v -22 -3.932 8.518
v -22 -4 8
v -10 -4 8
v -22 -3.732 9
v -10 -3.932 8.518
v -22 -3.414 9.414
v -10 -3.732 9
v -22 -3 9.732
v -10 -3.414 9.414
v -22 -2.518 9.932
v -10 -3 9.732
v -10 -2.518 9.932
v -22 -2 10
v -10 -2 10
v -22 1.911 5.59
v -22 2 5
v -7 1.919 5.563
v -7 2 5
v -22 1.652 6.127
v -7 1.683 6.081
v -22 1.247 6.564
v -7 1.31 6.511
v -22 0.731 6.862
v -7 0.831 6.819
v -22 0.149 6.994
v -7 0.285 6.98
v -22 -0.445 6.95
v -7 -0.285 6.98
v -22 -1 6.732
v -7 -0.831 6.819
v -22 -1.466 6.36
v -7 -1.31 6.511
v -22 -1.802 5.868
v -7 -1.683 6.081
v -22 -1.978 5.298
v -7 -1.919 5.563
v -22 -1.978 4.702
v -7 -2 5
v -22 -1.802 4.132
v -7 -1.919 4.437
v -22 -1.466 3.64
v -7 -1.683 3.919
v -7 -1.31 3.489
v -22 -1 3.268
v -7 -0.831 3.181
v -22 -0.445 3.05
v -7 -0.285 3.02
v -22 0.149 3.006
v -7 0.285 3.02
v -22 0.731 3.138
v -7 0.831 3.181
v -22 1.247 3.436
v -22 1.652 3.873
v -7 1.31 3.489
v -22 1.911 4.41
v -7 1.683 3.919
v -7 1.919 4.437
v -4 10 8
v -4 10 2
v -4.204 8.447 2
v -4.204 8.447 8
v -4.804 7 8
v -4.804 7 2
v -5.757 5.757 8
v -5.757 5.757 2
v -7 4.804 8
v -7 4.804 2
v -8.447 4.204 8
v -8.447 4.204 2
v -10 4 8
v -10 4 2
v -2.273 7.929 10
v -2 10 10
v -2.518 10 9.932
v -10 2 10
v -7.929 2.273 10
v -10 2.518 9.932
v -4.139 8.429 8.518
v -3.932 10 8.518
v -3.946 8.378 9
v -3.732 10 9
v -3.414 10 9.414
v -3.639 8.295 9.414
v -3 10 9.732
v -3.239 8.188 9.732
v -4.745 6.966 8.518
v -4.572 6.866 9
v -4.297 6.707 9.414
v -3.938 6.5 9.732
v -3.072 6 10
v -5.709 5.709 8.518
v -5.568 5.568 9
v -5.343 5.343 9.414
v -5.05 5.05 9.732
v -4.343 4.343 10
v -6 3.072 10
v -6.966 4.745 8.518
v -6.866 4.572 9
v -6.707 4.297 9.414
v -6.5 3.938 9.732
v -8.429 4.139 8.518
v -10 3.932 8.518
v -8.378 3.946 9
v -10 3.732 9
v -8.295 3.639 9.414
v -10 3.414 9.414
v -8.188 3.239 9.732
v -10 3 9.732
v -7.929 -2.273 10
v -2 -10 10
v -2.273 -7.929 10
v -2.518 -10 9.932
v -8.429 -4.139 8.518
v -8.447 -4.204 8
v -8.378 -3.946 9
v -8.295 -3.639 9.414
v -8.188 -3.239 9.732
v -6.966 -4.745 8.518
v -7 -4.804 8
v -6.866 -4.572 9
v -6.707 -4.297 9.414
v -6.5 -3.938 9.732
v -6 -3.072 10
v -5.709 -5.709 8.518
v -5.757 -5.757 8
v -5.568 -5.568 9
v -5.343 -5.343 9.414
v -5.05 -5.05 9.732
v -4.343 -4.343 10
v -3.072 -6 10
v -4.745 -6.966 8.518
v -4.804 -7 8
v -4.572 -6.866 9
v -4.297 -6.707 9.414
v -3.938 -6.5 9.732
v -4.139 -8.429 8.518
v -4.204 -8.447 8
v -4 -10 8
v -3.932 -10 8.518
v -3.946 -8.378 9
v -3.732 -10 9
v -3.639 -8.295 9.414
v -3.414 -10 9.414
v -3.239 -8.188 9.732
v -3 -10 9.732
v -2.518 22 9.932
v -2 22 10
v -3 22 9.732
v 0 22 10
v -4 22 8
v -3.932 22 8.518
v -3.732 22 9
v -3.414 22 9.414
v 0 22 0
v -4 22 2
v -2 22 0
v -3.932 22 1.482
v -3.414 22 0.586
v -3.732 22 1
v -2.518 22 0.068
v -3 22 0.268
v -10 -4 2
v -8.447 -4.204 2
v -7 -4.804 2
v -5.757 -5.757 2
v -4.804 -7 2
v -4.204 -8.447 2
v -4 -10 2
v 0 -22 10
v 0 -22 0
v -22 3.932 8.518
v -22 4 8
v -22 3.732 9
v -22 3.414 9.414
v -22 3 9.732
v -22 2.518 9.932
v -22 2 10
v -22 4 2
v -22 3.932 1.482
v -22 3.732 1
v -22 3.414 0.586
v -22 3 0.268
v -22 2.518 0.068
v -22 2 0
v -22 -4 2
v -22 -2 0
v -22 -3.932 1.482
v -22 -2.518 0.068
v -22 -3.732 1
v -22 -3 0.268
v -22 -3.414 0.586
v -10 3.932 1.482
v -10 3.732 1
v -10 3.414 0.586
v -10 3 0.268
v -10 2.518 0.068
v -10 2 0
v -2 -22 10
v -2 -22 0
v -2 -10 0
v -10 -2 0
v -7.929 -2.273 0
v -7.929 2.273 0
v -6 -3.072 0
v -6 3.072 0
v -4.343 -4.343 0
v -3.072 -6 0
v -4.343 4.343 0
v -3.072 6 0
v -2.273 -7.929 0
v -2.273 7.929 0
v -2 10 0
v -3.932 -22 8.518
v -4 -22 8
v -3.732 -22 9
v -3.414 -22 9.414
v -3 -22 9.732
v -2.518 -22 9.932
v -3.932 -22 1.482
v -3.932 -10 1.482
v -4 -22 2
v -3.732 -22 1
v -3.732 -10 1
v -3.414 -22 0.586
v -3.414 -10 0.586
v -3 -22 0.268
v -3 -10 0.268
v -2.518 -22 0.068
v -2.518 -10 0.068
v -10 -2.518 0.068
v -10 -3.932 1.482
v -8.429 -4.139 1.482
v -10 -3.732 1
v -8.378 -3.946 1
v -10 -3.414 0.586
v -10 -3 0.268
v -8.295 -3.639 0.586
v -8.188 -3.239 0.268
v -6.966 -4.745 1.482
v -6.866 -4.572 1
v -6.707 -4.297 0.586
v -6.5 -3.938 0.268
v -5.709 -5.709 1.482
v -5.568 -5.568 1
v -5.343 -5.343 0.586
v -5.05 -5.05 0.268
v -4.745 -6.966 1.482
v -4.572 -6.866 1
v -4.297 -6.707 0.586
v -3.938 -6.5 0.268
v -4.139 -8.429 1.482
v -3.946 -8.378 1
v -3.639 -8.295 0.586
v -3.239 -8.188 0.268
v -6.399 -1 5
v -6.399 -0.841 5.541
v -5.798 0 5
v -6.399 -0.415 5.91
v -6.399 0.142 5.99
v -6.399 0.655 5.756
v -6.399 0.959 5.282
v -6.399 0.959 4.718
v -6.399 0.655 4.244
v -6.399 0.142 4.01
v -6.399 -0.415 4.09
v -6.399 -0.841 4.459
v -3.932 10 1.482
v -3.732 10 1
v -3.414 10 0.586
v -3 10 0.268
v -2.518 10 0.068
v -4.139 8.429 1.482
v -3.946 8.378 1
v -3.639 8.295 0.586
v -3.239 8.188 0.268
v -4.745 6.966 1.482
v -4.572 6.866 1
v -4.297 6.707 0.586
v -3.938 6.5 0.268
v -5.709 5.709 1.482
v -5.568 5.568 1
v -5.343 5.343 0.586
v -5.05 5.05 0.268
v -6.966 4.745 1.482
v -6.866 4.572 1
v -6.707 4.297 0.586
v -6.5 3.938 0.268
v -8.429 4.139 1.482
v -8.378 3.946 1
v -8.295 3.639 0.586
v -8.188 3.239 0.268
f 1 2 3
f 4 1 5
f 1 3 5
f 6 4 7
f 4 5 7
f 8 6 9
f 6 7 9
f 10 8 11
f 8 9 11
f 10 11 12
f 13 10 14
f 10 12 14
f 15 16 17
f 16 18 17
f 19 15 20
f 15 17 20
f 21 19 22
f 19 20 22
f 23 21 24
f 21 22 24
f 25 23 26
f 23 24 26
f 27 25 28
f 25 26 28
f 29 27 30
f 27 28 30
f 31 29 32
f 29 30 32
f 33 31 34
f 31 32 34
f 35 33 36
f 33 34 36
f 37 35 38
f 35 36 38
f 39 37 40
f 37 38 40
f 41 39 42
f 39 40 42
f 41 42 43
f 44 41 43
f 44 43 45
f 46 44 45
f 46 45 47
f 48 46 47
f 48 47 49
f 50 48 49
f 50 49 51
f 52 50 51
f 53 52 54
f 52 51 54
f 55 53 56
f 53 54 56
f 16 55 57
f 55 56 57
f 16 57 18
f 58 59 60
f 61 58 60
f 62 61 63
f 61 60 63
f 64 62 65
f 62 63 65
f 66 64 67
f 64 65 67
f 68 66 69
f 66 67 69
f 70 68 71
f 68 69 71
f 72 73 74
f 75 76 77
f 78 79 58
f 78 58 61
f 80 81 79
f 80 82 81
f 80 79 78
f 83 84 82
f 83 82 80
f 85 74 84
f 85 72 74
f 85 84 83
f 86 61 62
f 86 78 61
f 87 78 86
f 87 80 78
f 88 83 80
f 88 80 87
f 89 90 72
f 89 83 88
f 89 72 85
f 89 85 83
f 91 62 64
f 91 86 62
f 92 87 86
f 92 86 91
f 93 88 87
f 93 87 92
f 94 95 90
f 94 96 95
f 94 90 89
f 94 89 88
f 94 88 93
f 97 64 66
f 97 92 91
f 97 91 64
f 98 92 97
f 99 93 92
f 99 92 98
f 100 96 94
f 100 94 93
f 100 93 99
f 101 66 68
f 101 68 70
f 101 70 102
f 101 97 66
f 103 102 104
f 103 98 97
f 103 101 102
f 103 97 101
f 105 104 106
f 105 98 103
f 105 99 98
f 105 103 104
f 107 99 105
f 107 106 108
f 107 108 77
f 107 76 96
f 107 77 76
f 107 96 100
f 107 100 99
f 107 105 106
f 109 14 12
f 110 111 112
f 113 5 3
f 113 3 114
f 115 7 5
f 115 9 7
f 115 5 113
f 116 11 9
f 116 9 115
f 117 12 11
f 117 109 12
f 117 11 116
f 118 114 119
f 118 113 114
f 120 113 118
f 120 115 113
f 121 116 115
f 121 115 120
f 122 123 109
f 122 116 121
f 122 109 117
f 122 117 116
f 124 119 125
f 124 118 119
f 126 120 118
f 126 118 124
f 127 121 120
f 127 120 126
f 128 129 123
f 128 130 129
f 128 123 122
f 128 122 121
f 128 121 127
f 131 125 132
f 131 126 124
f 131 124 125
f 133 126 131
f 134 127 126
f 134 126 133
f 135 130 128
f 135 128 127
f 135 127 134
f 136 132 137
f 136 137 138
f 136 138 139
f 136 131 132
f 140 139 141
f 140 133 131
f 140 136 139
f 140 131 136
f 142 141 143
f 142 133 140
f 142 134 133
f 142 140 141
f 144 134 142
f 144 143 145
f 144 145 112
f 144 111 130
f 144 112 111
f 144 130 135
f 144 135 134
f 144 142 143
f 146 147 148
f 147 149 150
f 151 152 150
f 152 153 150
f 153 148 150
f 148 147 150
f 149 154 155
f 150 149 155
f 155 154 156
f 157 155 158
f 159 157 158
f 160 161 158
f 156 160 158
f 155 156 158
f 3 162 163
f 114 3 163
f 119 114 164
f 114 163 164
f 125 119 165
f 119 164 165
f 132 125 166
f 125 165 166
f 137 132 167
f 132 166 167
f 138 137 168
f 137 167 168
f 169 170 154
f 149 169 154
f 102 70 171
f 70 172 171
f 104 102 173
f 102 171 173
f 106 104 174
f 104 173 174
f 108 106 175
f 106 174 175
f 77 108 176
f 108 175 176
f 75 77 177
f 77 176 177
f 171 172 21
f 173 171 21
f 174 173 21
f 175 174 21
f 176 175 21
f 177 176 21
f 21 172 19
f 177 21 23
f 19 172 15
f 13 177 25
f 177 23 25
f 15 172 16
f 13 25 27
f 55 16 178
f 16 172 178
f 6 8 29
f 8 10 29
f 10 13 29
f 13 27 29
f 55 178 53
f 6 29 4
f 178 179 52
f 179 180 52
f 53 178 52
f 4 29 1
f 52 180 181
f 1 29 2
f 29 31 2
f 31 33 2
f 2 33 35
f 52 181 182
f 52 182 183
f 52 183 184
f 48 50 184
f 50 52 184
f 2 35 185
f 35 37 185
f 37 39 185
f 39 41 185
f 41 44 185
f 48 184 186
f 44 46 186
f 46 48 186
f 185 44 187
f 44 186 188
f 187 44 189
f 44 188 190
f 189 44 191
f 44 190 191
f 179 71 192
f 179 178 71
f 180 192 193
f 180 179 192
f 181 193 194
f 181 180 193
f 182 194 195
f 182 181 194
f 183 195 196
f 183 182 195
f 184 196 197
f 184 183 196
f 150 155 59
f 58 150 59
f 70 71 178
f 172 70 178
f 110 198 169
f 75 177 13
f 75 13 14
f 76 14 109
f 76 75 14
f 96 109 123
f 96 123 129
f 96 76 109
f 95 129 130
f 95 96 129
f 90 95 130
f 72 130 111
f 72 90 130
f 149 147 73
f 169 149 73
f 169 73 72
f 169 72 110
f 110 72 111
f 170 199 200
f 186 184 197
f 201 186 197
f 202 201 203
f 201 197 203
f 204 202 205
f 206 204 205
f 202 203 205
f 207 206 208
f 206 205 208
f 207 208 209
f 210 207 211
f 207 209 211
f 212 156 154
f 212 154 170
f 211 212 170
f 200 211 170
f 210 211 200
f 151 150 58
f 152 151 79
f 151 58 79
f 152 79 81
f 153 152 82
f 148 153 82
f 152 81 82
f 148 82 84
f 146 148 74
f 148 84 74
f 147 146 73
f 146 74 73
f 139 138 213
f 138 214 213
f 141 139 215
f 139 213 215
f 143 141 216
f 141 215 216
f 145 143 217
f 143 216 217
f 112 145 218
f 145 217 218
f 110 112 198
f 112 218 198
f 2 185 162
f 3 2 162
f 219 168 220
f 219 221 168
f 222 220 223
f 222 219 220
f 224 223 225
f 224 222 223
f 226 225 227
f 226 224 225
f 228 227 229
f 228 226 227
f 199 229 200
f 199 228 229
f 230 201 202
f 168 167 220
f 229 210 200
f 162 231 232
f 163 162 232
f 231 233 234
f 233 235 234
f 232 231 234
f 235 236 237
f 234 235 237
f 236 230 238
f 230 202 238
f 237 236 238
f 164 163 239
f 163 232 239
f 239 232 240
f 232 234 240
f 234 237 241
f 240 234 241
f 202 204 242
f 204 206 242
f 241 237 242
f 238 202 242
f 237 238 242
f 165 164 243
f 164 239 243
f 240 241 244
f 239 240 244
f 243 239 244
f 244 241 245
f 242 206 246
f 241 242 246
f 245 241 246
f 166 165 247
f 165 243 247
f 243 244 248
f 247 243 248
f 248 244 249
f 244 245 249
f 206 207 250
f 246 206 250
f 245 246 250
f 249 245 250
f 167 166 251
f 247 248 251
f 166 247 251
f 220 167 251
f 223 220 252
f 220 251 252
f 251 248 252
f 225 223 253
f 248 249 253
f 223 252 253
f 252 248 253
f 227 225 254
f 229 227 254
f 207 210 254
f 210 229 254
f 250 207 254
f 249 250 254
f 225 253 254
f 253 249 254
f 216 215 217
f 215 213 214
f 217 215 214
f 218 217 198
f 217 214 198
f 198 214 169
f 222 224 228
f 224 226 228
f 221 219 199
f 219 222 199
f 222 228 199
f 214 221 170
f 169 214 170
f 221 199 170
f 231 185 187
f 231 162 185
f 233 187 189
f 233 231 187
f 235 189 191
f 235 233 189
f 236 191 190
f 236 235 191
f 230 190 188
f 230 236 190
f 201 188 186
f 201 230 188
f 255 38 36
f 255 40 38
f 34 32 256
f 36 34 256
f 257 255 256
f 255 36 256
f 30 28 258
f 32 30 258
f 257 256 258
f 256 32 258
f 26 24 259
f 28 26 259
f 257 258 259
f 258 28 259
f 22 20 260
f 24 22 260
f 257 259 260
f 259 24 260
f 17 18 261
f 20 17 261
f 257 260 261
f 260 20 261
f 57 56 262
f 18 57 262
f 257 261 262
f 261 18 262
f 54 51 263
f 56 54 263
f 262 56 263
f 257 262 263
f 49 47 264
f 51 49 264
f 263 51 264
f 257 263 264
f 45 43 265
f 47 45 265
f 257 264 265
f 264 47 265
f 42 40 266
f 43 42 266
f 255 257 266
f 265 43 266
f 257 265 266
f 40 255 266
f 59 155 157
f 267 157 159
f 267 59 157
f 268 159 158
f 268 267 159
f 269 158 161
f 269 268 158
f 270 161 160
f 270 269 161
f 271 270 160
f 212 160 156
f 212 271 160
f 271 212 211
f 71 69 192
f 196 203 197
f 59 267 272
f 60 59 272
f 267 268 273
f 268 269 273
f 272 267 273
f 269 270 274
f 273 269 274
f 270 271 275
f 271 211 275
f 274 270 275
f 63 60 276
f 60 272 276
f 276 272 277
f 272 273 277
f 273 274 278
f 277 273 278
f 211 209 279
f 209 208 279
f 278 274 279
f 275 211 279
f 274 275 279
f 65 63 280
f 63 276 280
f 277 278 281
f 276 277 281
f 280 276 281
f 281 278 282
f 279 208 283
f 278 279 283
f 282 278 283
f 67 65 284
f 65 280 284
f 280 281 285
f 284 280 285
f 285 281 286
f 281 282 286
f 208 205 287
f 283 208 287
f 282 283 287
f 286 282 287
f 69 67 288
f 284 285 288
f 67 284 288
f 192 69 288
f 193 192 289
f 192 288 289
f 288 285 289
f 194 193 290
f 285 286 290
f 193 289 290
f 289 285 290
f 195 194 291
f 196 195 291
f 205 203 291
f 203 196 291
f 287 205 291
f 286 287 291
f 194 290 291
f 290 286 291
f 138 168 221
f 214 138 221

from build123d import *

# Parameters (mm, degrees)
F1_DEPTH = 10
F2_R     = 2
F4_D     = 4
F4_DEPTH = 15
F4_TIP   = 1.2017212381


with BuildPart() as f1:
    # F0 (on Top) → F1 (new body)
    with BuildSketch(Plane.XY):
        with BuildLine():
            Line((0, -22), (0, 0))
            Line((0, 0), (0, 22))
            Line((0, 22), (-4, 22))
            Line((-4, 22), (-4, 10))
            ThreePointArc((-4, 10), (-5.7573593129, 5.7573593129), (-10, 4))
            Line((-10, 4), (-22, 4))
            Line((-22, 4), (-22, 0))
            Line((-22, 0), (-22, -4))
            Line((-22, -4), (-10, -4))
            ThreePointArc((-10, -4), (-5.7573593129, -5.7573593129), (-4, -10))
            Line((-4, -10), (-4, -22))
            Line((-4, -22), (0, -22))
        make_face()
    extrude(amount=F1_DEPTH)

    # F2
    f2_edges = [f1.edges().sort_by_distance(p)[0] for p in [
        (-5.757359, -5.757359, 10),
        (-4, 16, 10),
        (-5.757359, -5.757359, 0),
        (-5.757359, 5.757359, 0),
    ]]
    fillet(f2_edges, radius=F2_R)

    # F4
    with Locations(Plane(origin=(-22, 0, 0), x_dir=(0, -1, 0), z_dir=(-1, 0, 0))):
        with Locations((0, 5)):
            Hole(F4_D / 2, depth=F4_DEPTH)
            with Locations((0, 0, -(F4_DEPTH + F4_TIP / 2))):  # 118° drill point
                Cone(0, F4_D / 2, F4_TIP, mode=Mode.SUBTRACT)


solid = f1.part
